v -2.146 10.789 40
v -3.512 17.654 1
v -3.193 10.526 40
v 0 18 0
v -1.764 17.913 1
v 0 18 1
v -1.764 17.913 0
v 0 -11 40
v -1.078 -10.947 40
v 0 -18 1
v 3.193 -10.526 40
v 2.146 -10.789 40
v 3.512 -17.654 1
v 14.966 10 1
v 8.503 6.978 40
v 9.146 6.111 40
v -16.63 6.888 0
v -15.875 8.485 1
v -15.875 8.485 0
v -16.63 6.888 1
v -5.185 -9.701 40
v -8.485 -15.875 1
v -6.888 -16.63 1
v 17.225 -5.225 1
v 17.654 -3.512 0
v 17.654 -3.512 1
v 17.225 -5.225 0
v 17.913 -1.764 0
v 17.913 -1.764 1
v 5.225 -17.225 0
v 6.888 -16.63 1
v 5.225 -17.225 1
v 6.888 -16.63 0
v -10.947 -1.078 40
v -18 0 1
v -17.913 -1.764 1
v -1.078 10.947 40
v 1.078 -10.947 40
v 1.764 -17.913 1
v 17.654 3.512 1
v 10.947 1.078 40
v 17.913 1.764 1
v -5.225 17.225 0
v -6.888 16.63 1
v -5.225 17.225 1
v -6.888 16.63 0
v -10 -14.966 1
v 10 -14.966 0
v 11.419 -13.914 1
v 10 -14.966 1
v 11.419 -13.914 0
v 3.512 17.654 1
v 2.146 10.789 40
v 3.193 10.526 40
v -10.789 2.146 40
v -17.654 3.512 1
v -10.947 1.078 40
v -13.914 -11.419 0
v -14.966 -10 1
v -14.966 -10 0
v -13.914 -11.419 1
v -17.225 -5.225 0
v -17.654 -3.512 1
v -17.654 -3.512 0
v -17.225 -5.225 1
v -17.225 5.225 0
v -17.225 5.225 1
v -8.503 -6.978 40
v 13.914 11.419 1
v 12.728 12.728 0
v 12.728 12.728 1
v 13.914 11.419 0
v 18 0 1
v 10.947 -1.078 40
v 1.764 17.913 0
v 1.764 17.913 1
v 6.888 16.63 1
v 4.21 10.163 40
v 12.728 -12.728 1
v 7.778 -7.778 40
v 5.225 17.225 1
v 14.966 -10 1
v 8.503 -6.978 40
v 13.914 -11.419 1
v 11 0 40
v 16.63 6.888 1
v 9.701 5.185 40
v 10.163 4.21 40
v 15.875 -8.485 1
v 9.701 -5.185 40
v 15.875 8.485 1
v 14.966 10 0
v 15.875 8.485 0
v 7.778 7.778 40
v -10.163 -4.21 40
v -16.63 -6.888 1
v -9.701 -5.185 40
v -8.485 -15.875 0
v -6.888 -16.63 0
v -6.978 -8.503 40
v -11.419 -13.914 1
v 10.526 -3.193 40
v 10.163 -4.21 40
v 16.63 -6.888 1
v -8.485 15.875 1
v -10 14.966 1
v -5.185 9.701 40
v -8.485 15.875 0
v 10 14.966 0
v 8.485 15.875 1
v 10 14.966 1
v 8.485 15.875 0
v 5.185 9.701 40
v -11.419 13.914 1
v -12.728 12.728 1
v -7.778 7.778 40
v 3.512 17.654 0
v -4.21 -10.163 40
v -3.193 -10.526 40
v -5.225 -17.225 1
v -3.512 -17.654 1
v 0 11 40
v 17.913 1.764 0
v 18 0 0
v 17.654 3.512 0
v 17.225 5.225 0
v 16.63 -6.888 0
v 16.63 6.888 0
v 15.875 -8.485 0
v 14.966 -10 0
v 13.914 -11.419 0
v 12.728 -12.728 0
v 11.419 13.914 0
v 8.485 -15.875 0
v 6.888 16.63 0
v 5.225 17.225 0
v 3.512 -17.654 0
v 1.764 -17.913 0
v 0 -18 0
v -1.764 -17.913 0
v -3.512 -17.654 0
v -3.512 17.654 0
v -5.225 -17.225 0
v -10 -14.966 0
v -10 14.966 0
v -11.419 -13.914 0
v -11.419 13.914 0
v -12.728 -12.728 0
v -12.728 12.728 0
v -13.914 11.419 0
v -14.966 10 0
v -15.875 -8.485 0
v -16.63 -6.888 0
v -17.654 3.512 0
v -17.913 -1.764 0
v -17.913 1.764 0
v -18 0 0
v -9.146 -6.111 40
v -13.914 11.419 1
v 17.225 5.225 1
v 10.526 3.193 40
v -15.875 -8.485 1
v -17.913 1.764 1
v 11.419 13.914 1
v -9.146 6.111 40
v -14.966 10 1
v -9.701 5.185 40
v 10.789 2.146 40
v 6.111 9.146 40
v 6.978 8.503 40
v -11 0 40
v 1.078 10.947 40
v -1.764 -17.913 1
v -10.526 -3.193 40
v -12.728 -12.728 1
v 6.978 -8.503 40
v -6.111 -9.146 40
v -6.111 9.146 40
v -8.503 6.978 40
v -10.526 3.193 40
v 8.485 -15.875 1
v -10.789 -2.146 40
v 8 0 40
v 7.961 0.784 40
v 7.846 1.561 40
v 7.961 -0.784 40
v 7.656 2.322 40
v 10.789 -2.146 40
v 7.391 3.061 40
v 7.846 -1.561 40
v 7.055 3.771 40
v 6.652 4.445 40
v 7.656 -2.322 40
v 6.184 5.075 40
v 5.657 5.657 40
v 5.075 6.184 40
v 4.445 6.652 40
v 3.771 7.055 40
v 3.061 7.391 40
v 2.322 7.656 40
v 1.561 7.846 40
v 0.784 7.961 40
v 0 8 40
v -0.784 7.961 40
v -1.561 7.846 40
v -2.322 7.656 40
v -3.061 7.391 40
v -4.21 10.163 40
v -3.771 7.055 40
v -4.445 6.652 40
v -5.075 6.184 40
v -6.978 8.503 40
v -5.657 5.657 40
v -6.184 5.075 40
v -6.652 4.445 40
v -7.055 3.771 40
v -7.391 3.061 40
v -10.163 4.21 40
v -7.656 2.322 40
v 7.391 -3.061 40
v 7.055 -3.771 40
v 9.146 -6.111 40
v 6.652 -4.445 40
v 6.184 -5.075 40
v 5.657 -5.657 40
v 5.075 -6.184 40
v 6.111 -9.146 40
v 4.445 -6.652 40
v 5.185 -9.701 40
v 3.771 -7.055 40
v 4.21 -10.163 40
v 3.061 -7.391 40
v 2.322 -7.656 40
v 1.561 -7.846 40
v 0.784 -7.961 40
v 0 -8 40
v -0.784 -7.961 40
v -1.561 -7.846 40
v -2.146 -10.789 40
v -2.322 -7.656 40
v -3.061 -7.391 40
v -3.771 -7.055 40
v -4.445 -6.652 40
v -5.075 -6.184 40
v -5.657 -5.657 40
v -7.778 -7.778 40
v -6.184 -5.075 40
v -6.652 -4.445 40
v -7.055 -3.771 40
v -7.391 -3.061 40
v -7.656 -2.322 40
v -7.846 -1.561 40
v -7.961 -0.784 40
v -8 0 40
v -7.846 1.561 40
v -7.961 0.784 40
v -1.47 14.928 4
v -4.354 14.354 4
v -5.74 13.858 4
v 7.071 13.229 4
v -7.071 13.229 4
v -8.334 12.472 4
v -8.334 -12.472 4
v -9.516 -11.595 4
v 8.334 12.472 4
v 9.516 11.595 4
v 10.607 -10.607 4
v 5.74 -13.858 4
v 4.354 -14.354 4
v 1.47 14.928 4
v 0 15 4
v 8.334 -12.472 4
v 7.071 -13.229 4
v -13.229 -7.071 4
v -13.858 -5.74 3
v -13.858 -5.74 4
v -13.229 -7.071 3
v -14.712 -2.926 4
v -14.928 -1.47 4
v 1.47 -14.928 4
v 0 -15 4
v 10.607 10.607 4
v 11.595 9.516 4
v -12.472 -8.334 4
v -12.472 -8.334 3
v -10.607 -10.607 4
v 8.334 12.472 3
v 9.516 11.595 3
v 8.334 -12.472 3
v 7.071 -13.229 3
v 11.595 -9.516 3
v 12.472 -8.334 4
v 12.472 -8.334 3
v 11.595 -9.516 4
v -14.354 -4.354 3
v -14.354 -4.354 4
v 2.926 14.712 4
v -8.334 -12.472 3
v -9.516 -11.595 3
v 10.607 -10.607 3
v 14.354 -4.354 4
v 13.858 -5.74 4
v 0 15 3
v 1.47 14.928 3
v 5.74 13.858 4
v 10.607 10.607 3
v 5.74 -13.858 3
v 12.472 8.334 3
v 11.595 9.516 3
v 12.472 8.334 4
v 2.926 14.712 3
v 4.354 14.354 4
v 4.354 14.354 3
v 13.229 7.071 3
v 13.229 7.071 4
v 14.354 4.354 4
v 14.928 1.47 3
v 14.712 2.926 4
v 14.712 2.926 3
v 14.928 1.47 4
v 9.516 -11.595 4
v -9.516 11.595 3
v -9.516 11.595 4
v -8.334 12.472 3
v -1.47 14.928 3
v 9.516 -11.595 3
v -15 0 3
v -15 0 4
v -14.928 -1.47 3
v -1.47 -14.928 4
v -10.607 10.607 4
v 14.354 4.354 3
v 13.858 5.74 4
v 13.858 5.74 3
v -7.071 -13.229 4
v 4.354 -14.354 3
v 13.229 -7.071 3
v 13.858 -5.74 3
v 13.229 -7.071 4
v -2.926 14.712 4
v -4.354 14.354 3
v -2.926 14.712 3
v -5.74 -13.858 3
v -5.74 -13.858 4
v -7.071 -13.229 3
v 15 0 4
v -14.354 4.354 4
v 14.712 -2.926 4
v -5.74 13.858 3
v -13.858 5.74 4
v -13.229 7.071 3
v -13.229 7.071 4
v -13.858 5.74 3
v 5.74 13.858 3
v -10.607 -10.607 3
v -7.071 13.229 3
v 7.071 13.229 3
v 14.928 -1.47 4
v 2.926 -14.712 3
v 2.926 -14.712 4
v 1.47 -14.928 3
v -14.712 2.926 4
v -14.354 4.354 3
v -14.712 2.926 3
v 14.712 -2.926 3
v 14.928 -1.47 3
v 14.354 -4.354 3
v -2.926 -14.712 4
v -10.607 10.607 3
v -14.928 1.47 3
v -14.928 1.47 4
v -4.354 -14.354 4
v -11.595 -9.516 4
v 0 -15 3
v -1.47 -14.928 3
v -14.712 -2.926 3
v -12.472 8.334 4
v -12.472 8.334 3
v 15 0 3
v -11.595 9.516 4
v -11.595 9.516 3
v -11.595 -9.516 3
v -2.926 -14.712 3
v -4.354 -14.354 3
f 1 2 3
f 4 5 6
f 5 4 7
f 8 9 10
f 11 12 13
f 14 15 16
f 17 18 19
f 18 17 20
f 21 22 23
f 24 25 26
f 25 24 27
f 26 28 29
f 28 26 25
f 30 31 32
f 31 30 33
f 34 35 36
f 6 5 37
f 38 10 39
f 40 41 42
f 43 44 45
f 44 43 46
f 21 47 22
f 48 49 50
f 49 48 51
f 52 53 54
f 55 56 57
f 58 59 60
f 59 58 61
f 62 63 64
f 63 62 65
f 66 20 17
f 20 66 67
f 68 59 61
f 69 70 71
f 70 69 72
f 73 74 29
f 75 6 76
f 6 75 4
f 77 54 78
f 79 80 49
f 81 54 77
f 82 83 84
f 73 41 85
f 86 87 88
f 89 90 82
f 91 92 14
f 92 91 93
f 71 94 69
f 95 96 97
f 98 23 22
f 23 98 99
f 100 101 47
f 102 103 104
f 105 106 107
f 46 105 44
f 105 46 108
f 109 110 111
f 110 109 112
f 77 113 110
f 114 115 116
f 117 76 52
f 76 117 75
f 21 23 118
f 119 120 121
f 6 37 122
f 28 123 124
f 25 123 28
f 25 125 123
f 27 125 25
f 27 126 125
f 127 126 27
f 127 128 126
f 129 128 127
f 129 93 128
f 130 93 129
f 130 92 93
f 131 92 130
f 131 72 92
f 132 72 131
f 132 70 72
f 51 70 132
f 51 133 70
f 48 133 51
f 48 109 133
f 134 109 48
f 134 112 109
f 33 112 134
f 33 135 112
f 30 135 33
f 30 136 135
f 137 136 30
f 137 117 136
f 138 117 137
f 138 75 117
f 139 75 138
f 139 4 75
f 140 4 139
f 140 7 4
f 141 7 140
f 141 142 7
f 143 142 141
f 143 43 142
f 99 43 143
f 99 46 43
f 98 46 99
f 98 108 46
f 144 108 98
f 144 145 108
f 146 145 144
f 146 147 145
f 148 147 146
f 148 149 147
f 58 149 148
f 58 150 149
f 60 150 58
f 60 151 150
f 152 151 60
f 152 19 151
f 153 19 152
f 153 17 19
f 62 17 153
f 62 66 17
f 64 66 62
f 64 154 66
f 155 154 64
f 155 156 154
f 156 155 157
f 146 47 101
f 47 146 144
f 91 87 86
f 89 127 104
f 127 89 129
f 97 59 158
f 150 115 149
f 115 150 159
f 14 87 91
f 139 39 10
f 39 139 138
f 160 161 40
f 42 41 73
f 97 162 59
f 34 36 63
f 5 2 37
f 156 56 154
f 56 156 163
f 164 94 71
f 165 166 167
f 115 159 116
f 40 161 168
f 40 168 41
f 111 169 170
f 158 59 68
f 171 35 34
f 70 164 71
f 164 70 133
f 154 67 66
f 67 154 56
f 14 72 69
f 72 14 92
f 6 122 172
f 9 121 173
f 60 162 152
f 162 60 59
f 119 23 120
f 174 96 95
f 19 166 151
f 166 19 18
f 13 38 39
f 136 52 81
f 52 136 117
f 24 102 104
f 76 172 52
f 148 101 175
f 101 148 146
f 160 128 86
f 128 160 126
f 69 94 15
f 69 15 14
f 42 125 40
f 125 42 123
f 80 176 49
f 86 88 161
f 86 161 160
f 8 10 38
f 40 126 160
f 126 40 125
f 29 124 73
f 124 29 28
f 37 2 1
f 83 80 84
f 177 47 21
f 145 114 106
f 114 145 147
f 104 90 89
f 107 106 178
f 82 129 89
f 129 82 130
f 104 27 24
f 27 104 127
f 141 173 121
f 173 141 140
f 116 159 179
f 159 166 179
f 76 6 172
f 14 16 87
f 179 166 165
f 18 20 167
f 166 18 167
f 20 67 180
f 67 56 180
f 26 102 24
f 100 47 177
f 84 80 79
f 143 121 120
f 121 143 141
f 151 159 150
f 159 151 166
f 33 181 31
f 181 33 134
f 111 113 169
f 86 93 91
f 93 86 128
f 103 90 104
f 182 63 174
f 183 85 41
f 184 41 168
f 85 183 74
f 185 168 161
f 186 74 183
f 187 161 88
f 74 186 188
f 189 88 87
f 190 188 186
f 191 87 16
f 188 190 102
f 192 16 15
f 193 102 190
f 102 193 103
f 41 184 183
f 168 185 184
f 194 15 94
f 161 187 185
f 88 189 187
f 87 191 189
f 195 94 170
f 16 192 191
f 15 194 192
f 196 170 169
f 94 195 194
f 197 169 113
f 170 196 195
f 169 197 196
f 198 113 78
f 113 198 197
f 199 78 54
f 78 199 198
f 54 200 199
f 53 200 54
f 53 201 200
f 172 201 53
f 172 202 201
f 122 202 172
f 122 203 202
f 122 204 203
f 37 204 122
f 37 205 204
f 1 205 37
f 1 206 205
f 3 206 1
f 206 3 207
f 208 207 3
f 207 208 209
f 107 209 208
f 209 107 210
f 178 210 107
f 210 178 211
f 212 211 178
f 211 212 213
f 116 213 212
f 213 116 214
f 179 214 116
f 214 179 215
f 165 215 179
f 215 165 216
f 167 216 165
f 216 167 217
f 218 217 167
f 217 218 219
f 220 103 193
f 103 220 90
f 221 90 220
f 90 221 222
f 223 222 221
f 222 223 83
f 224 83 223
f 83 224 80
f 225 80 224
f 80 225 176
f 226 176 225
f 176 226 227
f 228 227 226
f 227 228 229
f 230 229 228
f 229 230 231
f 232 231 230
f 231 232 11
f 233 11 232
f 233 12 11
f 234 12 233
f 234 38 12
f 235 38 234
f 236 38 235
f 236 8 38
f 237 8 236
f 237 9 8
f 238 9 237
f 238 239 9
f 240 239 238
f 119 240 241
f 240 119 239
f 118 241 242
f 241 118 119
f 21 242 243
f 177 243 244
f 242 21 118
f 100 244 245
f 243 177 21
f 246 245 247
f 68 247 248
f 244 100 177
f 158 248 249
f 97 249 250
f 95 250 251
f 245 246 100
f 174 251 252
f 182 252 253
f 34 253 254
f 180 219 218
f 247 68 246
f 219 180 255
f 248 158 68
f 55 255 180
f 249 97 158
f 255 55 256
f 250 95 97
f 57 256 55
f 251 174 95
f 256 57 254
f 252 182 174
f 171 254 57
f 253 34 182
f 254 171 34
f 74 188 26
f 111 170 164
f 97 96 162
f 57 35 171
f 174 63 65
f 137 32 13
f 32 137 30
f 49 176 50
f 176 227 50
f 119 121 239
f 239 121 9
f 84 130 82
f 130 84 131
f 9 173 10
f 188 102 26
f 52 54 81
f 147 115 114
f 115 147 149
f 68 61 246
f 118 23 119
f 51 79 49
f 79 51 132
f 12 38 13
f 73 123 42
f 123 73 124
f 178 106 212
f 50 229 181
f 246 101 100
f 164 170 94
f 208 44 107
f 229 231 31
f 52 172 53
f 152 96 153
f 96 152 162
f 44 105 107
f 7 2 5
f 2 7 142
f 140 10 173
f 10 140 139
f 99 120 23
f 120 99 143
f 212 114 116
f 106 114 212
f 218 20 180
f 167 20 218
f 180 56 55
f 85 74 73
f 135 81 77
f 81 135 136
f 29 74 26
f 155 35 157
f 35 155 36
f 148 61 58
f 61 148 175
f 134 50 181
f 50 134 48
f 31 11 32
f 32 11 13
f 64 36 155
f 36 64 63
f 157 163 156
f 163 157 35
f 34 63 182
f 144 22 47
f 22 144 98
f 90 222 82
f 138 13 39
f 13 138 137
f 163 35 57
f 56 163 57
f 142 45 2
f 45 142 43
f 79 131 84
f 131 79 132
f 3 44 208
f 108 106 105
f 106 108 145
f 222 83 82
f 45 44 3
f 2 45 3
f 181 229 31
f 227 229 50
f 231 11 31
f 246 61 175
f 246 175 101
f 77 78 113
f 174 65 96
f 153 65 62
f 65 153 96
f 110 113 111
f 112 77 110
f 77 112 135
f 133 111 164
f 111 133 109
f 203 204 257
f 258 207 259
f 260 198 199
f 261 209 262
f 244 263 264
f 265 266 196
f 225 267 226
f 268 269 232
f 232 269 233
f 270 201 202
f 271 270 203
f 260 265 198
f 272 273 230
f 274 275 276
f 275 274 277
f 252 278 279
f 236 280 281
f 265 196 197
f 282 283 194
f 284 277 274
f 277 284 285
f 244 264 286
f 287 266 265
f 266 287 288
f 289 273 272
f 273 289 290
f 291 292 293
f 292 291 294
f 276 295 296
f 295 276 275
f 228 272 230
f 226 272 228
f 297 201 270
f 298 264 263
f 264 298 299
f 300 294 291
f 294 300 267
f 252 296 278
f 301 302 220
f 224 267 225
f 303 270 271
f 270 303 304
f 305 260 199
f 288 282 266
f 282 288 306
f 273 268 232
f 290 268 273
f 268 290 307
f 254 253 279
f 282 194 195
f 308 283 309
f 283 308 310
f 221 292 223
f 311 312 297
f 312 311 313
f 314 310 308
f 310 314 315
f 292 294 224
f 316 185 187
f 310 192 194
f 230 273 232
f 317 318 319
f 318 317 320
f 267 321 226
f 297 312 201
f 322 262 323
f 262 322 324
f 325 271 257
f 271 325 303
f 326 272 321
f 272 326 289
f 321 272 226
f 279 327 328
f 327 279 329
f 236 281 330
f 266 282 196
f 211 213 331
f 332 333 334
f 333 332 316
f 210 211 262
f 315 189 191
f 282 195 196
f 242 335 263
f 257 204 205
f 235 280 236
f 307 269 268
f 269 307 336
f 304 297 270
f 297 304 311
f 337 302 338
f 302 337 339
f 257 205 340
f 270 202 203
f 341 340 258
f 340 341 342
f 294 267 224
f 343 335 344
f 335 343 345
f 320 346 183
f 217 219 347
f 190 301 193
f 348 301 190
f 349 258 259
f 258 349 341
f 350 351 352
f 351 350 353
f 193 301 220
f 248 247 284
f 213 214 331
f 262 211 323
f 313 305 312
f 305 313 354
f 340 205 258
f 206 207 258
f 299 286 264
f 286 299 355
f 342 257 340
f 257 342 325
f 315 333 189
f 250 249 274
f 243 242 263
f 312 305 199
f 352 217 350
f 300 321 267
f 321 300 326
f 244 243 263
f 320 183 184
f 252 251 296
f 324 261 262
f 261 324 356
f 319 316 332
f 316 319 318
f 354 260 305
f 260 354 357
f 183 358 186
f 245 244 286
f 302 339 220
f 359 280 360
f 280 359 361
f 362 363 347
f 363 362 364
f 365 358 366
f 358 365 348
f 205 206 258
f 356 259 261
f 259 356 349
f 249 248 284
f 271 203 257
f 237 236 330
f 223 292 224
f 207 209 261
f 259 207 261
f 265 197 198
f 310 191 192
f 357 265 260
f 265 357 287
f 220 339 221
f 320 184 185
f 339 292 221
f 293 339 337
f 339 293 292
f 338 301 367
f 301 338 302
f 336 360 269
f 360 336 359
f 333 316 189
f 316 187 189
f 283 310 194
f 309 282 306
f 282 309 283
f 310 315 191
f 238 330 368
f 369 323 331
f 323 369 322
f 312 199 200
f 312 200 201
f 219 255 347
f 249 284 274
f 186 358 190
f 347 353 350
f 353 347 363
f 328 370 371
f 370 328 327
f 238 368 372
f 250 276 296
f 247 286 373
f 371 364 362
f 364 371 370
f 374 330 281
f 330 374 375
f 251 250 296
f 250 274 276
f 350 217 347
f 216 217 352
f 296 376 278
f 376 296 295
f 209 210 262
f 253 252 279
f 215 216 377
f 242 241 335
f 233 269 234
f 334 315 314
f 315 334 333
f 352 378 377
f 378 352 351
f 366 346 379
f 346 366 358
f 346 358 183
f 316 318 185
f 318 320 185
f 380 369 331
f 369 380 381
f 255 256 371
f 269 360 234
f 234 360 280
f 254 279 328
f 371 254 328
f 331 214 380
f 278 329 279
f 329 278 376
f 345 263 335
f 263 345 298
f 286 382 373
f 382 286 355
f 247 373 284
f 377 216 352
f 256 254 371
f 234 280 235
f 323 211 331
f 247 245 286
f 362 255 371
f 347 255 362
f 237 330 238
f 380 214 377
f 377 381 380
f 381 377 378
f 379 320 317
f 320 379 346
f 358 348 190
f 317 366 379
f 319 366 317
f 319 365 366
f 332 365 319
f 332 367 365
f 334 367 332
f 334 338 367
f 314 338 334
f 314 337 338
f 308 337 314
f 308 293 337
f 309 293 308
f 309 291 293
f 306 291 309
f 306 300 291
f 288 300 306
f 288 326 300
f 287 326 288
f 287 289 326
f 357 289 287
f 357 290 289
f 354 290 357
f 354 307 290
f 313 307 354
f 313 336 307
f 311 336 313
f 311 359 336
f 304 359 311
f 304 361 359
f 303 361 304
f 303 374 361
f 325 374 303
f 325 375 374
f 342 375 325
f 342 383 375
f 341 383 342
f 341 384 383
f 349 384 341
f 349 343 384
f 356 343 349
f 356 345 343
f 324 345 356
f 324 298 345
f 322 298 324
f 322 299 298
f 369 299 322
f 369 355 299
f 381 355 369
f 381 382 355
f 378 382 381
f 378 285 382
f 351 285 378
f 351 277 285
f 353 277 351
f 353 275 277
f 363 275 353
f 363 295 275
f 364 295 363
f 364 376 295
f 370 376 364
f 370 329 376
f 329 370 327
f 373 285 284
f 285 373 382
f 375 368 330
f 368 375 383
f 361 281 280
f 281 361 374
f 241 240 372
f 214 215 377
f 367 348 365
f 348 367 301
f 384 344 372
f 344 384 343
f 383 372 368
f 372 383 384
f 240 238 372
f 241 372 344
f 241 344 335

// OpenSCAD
// Parametric vase
height = 40;      // mm
wall = 3;         // mm
base_radius = 18; // mm
neck_radius = 11; // mm

difference() {
    hull() {
        cylinder(r=base_radius, h=1, $fn=64);
        translate([0,0,height-1]) cylinder(r=neck_radius, h=1, $fn=64);
    }
    translate([0,0,wall])
    hull() {
        cylinder(r=base_radius-wall, h=1, $fn=64);
        translate([0,0,height-1-wall]) cylinder(r=neck_radius-wall, h=1, $fn=64);
    }
}
